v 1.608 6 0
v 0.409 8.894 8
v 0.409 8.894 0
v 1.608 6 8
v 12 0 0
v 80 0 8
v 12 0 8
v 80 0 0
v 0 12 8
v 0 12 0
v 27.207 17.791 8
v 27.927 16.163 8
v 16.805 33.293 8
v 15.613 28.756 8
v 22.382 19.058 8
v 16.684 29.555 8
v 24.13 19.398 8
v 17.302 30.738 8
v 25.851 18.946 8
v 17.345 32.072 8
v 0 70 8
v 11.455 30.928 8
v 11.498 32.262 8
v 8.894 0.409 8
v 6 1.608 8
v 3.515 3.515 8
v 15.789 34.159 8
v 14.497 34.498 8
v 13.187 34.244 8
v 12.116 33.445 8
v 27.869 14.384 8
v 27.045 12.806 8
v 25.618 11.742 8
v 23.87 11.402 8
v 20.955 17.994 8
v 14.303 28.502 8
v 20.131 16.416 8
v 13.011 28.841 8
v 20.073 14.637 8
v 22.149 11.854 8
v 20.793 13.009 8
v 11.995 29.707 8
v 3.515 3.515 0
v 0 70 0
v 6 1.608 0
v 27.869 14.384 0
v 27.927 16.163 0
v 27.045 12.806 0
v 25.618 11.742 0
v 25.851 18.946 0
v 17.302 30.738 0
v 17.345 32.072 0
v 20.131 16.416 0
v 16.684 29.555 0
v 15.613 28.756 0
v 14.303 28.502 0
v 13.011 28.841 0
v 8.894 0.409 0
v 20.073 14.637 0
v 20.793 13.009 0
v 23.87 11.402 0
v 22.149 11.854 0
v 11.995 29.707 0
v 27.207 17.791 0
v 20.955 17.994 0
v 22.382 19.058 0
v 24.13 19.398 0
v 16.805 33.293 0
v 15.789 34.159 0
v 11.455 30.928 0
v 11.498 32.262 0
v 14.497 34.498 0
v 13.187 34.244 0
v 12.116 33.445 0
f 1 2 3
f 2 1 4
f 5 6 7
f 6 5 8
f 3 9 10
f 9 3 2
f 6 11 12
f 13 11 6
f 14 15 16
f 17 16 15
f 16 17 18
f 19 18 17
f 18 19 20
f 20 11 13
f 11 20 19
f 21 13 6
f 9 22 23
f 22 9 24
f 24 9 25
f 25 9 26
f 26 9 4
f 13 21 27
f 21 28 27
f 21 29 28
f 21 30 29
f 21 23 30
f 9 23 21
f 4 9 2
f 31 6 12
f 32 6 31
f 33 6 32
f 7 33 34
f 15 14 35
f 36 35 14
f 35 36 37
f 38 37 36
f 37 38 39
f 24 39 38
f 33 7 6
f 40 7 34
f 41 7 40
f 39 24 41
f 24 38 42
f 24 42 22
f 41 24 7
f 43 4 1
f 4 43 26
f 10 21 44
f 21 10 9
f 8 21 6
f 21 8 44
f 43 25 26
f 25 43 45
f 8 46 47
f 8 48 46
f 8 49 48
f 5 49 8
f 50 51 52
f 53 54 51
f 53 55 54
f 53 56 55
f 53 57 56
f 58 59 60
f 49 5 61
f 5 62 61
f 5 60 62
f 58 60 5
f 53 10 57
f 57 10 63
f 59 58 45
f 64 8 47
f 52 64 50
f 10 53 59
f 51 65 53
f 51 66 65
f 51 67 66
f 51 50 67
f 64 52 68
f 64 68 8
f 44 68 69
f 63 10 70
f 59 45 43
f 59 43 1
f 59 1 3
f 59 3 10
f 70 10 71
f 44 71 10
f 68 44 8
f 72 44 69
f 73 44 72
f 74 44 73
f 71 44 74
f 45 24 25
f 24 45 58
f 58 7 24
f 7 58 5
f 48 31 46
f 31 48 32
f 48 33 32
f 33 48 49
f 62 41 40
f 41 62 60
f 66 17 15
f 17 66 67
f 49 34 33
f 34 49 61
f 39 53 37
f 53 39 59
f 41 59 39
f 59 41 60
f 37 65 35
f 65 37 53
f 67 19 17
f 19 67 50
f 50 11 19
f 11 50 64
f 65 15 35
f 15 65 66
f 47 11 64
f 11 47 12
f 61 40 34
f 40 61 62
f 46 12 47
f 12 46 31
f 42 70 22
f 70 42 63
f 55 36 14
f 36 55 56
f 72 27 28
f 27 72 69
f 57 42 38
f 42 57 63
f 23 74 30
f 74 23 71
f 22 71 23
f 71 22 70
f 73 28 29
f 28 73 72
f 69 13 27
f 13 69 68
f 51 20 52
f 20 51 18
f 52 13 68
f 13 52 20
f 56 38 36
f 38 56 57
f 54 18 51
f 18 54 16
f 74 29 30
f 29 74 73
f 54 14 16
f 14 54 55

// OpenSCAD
$fn = 32;

// ----------------------------------------------------------------------
// Bracket plate: corner pad 80 x 70, fillet R12
// ----------------------------------------------------------------------

// --- parameters (mm) ---
hole_r = 3;               // bolt hole radius
plate_t = 8;              // plate thickness, Z (extrusion height)
leg_a = 80;               // base leg
leg_b = 70;               // height leg
fillet_r = 12;            // right-angle fillet radius

hole_d1 = 2 * hole_r + 2;
hole_d2 = 2 * hole_r;

profile = [[12, 0], [80, 0], [0, 70], [0, 12], [0.409, 8.894], [1.608, 6], [3.515, 3.515], [6, 1.608], [8.894, 0.409]];  // primary outline, 9 points, counter clockwise
void_1 = [[27.927, 16.163], [27.207, 17.791], [25.851, 18.946], [24.13, 19.398], [22.382, 19.058], [20.955, 17.994], [20.131, 16.416], [20.073, 14.637], [20.793, 13.009], [22.149, 11.854], [23.87, 11.402], [25.618, 11.742], [27.045, 12.806], [27.869, 14.384]];  // mount hole 1, 14 points
void_2 = [[17.345, 32.072], [16.805, 33.293], [15.789, 34.159], [14.497, 34.498], [13.187, 34.244], [12.116, 33.445], [11.498, 32.262], [11.455, 30.928], [11.995, 29.707], [13.011, 28.841], [14.303, 28.502], [15.613, 28.756], [16.684, 29.555], [17.302, 30.738]];  // mount hole 2, 14 points

// --- the one profile operation ---
difference() {
  linear_extrude(height = plate_t) polygon(points = profile);
  translate([0, 0, -1])
    linear_extrude(height = plate_t + 2) polygon(points = void_1);
  translate([0, 0, -1])
    linear_extrude(height = plate_t + 2) polygon(points = void_2);
}
